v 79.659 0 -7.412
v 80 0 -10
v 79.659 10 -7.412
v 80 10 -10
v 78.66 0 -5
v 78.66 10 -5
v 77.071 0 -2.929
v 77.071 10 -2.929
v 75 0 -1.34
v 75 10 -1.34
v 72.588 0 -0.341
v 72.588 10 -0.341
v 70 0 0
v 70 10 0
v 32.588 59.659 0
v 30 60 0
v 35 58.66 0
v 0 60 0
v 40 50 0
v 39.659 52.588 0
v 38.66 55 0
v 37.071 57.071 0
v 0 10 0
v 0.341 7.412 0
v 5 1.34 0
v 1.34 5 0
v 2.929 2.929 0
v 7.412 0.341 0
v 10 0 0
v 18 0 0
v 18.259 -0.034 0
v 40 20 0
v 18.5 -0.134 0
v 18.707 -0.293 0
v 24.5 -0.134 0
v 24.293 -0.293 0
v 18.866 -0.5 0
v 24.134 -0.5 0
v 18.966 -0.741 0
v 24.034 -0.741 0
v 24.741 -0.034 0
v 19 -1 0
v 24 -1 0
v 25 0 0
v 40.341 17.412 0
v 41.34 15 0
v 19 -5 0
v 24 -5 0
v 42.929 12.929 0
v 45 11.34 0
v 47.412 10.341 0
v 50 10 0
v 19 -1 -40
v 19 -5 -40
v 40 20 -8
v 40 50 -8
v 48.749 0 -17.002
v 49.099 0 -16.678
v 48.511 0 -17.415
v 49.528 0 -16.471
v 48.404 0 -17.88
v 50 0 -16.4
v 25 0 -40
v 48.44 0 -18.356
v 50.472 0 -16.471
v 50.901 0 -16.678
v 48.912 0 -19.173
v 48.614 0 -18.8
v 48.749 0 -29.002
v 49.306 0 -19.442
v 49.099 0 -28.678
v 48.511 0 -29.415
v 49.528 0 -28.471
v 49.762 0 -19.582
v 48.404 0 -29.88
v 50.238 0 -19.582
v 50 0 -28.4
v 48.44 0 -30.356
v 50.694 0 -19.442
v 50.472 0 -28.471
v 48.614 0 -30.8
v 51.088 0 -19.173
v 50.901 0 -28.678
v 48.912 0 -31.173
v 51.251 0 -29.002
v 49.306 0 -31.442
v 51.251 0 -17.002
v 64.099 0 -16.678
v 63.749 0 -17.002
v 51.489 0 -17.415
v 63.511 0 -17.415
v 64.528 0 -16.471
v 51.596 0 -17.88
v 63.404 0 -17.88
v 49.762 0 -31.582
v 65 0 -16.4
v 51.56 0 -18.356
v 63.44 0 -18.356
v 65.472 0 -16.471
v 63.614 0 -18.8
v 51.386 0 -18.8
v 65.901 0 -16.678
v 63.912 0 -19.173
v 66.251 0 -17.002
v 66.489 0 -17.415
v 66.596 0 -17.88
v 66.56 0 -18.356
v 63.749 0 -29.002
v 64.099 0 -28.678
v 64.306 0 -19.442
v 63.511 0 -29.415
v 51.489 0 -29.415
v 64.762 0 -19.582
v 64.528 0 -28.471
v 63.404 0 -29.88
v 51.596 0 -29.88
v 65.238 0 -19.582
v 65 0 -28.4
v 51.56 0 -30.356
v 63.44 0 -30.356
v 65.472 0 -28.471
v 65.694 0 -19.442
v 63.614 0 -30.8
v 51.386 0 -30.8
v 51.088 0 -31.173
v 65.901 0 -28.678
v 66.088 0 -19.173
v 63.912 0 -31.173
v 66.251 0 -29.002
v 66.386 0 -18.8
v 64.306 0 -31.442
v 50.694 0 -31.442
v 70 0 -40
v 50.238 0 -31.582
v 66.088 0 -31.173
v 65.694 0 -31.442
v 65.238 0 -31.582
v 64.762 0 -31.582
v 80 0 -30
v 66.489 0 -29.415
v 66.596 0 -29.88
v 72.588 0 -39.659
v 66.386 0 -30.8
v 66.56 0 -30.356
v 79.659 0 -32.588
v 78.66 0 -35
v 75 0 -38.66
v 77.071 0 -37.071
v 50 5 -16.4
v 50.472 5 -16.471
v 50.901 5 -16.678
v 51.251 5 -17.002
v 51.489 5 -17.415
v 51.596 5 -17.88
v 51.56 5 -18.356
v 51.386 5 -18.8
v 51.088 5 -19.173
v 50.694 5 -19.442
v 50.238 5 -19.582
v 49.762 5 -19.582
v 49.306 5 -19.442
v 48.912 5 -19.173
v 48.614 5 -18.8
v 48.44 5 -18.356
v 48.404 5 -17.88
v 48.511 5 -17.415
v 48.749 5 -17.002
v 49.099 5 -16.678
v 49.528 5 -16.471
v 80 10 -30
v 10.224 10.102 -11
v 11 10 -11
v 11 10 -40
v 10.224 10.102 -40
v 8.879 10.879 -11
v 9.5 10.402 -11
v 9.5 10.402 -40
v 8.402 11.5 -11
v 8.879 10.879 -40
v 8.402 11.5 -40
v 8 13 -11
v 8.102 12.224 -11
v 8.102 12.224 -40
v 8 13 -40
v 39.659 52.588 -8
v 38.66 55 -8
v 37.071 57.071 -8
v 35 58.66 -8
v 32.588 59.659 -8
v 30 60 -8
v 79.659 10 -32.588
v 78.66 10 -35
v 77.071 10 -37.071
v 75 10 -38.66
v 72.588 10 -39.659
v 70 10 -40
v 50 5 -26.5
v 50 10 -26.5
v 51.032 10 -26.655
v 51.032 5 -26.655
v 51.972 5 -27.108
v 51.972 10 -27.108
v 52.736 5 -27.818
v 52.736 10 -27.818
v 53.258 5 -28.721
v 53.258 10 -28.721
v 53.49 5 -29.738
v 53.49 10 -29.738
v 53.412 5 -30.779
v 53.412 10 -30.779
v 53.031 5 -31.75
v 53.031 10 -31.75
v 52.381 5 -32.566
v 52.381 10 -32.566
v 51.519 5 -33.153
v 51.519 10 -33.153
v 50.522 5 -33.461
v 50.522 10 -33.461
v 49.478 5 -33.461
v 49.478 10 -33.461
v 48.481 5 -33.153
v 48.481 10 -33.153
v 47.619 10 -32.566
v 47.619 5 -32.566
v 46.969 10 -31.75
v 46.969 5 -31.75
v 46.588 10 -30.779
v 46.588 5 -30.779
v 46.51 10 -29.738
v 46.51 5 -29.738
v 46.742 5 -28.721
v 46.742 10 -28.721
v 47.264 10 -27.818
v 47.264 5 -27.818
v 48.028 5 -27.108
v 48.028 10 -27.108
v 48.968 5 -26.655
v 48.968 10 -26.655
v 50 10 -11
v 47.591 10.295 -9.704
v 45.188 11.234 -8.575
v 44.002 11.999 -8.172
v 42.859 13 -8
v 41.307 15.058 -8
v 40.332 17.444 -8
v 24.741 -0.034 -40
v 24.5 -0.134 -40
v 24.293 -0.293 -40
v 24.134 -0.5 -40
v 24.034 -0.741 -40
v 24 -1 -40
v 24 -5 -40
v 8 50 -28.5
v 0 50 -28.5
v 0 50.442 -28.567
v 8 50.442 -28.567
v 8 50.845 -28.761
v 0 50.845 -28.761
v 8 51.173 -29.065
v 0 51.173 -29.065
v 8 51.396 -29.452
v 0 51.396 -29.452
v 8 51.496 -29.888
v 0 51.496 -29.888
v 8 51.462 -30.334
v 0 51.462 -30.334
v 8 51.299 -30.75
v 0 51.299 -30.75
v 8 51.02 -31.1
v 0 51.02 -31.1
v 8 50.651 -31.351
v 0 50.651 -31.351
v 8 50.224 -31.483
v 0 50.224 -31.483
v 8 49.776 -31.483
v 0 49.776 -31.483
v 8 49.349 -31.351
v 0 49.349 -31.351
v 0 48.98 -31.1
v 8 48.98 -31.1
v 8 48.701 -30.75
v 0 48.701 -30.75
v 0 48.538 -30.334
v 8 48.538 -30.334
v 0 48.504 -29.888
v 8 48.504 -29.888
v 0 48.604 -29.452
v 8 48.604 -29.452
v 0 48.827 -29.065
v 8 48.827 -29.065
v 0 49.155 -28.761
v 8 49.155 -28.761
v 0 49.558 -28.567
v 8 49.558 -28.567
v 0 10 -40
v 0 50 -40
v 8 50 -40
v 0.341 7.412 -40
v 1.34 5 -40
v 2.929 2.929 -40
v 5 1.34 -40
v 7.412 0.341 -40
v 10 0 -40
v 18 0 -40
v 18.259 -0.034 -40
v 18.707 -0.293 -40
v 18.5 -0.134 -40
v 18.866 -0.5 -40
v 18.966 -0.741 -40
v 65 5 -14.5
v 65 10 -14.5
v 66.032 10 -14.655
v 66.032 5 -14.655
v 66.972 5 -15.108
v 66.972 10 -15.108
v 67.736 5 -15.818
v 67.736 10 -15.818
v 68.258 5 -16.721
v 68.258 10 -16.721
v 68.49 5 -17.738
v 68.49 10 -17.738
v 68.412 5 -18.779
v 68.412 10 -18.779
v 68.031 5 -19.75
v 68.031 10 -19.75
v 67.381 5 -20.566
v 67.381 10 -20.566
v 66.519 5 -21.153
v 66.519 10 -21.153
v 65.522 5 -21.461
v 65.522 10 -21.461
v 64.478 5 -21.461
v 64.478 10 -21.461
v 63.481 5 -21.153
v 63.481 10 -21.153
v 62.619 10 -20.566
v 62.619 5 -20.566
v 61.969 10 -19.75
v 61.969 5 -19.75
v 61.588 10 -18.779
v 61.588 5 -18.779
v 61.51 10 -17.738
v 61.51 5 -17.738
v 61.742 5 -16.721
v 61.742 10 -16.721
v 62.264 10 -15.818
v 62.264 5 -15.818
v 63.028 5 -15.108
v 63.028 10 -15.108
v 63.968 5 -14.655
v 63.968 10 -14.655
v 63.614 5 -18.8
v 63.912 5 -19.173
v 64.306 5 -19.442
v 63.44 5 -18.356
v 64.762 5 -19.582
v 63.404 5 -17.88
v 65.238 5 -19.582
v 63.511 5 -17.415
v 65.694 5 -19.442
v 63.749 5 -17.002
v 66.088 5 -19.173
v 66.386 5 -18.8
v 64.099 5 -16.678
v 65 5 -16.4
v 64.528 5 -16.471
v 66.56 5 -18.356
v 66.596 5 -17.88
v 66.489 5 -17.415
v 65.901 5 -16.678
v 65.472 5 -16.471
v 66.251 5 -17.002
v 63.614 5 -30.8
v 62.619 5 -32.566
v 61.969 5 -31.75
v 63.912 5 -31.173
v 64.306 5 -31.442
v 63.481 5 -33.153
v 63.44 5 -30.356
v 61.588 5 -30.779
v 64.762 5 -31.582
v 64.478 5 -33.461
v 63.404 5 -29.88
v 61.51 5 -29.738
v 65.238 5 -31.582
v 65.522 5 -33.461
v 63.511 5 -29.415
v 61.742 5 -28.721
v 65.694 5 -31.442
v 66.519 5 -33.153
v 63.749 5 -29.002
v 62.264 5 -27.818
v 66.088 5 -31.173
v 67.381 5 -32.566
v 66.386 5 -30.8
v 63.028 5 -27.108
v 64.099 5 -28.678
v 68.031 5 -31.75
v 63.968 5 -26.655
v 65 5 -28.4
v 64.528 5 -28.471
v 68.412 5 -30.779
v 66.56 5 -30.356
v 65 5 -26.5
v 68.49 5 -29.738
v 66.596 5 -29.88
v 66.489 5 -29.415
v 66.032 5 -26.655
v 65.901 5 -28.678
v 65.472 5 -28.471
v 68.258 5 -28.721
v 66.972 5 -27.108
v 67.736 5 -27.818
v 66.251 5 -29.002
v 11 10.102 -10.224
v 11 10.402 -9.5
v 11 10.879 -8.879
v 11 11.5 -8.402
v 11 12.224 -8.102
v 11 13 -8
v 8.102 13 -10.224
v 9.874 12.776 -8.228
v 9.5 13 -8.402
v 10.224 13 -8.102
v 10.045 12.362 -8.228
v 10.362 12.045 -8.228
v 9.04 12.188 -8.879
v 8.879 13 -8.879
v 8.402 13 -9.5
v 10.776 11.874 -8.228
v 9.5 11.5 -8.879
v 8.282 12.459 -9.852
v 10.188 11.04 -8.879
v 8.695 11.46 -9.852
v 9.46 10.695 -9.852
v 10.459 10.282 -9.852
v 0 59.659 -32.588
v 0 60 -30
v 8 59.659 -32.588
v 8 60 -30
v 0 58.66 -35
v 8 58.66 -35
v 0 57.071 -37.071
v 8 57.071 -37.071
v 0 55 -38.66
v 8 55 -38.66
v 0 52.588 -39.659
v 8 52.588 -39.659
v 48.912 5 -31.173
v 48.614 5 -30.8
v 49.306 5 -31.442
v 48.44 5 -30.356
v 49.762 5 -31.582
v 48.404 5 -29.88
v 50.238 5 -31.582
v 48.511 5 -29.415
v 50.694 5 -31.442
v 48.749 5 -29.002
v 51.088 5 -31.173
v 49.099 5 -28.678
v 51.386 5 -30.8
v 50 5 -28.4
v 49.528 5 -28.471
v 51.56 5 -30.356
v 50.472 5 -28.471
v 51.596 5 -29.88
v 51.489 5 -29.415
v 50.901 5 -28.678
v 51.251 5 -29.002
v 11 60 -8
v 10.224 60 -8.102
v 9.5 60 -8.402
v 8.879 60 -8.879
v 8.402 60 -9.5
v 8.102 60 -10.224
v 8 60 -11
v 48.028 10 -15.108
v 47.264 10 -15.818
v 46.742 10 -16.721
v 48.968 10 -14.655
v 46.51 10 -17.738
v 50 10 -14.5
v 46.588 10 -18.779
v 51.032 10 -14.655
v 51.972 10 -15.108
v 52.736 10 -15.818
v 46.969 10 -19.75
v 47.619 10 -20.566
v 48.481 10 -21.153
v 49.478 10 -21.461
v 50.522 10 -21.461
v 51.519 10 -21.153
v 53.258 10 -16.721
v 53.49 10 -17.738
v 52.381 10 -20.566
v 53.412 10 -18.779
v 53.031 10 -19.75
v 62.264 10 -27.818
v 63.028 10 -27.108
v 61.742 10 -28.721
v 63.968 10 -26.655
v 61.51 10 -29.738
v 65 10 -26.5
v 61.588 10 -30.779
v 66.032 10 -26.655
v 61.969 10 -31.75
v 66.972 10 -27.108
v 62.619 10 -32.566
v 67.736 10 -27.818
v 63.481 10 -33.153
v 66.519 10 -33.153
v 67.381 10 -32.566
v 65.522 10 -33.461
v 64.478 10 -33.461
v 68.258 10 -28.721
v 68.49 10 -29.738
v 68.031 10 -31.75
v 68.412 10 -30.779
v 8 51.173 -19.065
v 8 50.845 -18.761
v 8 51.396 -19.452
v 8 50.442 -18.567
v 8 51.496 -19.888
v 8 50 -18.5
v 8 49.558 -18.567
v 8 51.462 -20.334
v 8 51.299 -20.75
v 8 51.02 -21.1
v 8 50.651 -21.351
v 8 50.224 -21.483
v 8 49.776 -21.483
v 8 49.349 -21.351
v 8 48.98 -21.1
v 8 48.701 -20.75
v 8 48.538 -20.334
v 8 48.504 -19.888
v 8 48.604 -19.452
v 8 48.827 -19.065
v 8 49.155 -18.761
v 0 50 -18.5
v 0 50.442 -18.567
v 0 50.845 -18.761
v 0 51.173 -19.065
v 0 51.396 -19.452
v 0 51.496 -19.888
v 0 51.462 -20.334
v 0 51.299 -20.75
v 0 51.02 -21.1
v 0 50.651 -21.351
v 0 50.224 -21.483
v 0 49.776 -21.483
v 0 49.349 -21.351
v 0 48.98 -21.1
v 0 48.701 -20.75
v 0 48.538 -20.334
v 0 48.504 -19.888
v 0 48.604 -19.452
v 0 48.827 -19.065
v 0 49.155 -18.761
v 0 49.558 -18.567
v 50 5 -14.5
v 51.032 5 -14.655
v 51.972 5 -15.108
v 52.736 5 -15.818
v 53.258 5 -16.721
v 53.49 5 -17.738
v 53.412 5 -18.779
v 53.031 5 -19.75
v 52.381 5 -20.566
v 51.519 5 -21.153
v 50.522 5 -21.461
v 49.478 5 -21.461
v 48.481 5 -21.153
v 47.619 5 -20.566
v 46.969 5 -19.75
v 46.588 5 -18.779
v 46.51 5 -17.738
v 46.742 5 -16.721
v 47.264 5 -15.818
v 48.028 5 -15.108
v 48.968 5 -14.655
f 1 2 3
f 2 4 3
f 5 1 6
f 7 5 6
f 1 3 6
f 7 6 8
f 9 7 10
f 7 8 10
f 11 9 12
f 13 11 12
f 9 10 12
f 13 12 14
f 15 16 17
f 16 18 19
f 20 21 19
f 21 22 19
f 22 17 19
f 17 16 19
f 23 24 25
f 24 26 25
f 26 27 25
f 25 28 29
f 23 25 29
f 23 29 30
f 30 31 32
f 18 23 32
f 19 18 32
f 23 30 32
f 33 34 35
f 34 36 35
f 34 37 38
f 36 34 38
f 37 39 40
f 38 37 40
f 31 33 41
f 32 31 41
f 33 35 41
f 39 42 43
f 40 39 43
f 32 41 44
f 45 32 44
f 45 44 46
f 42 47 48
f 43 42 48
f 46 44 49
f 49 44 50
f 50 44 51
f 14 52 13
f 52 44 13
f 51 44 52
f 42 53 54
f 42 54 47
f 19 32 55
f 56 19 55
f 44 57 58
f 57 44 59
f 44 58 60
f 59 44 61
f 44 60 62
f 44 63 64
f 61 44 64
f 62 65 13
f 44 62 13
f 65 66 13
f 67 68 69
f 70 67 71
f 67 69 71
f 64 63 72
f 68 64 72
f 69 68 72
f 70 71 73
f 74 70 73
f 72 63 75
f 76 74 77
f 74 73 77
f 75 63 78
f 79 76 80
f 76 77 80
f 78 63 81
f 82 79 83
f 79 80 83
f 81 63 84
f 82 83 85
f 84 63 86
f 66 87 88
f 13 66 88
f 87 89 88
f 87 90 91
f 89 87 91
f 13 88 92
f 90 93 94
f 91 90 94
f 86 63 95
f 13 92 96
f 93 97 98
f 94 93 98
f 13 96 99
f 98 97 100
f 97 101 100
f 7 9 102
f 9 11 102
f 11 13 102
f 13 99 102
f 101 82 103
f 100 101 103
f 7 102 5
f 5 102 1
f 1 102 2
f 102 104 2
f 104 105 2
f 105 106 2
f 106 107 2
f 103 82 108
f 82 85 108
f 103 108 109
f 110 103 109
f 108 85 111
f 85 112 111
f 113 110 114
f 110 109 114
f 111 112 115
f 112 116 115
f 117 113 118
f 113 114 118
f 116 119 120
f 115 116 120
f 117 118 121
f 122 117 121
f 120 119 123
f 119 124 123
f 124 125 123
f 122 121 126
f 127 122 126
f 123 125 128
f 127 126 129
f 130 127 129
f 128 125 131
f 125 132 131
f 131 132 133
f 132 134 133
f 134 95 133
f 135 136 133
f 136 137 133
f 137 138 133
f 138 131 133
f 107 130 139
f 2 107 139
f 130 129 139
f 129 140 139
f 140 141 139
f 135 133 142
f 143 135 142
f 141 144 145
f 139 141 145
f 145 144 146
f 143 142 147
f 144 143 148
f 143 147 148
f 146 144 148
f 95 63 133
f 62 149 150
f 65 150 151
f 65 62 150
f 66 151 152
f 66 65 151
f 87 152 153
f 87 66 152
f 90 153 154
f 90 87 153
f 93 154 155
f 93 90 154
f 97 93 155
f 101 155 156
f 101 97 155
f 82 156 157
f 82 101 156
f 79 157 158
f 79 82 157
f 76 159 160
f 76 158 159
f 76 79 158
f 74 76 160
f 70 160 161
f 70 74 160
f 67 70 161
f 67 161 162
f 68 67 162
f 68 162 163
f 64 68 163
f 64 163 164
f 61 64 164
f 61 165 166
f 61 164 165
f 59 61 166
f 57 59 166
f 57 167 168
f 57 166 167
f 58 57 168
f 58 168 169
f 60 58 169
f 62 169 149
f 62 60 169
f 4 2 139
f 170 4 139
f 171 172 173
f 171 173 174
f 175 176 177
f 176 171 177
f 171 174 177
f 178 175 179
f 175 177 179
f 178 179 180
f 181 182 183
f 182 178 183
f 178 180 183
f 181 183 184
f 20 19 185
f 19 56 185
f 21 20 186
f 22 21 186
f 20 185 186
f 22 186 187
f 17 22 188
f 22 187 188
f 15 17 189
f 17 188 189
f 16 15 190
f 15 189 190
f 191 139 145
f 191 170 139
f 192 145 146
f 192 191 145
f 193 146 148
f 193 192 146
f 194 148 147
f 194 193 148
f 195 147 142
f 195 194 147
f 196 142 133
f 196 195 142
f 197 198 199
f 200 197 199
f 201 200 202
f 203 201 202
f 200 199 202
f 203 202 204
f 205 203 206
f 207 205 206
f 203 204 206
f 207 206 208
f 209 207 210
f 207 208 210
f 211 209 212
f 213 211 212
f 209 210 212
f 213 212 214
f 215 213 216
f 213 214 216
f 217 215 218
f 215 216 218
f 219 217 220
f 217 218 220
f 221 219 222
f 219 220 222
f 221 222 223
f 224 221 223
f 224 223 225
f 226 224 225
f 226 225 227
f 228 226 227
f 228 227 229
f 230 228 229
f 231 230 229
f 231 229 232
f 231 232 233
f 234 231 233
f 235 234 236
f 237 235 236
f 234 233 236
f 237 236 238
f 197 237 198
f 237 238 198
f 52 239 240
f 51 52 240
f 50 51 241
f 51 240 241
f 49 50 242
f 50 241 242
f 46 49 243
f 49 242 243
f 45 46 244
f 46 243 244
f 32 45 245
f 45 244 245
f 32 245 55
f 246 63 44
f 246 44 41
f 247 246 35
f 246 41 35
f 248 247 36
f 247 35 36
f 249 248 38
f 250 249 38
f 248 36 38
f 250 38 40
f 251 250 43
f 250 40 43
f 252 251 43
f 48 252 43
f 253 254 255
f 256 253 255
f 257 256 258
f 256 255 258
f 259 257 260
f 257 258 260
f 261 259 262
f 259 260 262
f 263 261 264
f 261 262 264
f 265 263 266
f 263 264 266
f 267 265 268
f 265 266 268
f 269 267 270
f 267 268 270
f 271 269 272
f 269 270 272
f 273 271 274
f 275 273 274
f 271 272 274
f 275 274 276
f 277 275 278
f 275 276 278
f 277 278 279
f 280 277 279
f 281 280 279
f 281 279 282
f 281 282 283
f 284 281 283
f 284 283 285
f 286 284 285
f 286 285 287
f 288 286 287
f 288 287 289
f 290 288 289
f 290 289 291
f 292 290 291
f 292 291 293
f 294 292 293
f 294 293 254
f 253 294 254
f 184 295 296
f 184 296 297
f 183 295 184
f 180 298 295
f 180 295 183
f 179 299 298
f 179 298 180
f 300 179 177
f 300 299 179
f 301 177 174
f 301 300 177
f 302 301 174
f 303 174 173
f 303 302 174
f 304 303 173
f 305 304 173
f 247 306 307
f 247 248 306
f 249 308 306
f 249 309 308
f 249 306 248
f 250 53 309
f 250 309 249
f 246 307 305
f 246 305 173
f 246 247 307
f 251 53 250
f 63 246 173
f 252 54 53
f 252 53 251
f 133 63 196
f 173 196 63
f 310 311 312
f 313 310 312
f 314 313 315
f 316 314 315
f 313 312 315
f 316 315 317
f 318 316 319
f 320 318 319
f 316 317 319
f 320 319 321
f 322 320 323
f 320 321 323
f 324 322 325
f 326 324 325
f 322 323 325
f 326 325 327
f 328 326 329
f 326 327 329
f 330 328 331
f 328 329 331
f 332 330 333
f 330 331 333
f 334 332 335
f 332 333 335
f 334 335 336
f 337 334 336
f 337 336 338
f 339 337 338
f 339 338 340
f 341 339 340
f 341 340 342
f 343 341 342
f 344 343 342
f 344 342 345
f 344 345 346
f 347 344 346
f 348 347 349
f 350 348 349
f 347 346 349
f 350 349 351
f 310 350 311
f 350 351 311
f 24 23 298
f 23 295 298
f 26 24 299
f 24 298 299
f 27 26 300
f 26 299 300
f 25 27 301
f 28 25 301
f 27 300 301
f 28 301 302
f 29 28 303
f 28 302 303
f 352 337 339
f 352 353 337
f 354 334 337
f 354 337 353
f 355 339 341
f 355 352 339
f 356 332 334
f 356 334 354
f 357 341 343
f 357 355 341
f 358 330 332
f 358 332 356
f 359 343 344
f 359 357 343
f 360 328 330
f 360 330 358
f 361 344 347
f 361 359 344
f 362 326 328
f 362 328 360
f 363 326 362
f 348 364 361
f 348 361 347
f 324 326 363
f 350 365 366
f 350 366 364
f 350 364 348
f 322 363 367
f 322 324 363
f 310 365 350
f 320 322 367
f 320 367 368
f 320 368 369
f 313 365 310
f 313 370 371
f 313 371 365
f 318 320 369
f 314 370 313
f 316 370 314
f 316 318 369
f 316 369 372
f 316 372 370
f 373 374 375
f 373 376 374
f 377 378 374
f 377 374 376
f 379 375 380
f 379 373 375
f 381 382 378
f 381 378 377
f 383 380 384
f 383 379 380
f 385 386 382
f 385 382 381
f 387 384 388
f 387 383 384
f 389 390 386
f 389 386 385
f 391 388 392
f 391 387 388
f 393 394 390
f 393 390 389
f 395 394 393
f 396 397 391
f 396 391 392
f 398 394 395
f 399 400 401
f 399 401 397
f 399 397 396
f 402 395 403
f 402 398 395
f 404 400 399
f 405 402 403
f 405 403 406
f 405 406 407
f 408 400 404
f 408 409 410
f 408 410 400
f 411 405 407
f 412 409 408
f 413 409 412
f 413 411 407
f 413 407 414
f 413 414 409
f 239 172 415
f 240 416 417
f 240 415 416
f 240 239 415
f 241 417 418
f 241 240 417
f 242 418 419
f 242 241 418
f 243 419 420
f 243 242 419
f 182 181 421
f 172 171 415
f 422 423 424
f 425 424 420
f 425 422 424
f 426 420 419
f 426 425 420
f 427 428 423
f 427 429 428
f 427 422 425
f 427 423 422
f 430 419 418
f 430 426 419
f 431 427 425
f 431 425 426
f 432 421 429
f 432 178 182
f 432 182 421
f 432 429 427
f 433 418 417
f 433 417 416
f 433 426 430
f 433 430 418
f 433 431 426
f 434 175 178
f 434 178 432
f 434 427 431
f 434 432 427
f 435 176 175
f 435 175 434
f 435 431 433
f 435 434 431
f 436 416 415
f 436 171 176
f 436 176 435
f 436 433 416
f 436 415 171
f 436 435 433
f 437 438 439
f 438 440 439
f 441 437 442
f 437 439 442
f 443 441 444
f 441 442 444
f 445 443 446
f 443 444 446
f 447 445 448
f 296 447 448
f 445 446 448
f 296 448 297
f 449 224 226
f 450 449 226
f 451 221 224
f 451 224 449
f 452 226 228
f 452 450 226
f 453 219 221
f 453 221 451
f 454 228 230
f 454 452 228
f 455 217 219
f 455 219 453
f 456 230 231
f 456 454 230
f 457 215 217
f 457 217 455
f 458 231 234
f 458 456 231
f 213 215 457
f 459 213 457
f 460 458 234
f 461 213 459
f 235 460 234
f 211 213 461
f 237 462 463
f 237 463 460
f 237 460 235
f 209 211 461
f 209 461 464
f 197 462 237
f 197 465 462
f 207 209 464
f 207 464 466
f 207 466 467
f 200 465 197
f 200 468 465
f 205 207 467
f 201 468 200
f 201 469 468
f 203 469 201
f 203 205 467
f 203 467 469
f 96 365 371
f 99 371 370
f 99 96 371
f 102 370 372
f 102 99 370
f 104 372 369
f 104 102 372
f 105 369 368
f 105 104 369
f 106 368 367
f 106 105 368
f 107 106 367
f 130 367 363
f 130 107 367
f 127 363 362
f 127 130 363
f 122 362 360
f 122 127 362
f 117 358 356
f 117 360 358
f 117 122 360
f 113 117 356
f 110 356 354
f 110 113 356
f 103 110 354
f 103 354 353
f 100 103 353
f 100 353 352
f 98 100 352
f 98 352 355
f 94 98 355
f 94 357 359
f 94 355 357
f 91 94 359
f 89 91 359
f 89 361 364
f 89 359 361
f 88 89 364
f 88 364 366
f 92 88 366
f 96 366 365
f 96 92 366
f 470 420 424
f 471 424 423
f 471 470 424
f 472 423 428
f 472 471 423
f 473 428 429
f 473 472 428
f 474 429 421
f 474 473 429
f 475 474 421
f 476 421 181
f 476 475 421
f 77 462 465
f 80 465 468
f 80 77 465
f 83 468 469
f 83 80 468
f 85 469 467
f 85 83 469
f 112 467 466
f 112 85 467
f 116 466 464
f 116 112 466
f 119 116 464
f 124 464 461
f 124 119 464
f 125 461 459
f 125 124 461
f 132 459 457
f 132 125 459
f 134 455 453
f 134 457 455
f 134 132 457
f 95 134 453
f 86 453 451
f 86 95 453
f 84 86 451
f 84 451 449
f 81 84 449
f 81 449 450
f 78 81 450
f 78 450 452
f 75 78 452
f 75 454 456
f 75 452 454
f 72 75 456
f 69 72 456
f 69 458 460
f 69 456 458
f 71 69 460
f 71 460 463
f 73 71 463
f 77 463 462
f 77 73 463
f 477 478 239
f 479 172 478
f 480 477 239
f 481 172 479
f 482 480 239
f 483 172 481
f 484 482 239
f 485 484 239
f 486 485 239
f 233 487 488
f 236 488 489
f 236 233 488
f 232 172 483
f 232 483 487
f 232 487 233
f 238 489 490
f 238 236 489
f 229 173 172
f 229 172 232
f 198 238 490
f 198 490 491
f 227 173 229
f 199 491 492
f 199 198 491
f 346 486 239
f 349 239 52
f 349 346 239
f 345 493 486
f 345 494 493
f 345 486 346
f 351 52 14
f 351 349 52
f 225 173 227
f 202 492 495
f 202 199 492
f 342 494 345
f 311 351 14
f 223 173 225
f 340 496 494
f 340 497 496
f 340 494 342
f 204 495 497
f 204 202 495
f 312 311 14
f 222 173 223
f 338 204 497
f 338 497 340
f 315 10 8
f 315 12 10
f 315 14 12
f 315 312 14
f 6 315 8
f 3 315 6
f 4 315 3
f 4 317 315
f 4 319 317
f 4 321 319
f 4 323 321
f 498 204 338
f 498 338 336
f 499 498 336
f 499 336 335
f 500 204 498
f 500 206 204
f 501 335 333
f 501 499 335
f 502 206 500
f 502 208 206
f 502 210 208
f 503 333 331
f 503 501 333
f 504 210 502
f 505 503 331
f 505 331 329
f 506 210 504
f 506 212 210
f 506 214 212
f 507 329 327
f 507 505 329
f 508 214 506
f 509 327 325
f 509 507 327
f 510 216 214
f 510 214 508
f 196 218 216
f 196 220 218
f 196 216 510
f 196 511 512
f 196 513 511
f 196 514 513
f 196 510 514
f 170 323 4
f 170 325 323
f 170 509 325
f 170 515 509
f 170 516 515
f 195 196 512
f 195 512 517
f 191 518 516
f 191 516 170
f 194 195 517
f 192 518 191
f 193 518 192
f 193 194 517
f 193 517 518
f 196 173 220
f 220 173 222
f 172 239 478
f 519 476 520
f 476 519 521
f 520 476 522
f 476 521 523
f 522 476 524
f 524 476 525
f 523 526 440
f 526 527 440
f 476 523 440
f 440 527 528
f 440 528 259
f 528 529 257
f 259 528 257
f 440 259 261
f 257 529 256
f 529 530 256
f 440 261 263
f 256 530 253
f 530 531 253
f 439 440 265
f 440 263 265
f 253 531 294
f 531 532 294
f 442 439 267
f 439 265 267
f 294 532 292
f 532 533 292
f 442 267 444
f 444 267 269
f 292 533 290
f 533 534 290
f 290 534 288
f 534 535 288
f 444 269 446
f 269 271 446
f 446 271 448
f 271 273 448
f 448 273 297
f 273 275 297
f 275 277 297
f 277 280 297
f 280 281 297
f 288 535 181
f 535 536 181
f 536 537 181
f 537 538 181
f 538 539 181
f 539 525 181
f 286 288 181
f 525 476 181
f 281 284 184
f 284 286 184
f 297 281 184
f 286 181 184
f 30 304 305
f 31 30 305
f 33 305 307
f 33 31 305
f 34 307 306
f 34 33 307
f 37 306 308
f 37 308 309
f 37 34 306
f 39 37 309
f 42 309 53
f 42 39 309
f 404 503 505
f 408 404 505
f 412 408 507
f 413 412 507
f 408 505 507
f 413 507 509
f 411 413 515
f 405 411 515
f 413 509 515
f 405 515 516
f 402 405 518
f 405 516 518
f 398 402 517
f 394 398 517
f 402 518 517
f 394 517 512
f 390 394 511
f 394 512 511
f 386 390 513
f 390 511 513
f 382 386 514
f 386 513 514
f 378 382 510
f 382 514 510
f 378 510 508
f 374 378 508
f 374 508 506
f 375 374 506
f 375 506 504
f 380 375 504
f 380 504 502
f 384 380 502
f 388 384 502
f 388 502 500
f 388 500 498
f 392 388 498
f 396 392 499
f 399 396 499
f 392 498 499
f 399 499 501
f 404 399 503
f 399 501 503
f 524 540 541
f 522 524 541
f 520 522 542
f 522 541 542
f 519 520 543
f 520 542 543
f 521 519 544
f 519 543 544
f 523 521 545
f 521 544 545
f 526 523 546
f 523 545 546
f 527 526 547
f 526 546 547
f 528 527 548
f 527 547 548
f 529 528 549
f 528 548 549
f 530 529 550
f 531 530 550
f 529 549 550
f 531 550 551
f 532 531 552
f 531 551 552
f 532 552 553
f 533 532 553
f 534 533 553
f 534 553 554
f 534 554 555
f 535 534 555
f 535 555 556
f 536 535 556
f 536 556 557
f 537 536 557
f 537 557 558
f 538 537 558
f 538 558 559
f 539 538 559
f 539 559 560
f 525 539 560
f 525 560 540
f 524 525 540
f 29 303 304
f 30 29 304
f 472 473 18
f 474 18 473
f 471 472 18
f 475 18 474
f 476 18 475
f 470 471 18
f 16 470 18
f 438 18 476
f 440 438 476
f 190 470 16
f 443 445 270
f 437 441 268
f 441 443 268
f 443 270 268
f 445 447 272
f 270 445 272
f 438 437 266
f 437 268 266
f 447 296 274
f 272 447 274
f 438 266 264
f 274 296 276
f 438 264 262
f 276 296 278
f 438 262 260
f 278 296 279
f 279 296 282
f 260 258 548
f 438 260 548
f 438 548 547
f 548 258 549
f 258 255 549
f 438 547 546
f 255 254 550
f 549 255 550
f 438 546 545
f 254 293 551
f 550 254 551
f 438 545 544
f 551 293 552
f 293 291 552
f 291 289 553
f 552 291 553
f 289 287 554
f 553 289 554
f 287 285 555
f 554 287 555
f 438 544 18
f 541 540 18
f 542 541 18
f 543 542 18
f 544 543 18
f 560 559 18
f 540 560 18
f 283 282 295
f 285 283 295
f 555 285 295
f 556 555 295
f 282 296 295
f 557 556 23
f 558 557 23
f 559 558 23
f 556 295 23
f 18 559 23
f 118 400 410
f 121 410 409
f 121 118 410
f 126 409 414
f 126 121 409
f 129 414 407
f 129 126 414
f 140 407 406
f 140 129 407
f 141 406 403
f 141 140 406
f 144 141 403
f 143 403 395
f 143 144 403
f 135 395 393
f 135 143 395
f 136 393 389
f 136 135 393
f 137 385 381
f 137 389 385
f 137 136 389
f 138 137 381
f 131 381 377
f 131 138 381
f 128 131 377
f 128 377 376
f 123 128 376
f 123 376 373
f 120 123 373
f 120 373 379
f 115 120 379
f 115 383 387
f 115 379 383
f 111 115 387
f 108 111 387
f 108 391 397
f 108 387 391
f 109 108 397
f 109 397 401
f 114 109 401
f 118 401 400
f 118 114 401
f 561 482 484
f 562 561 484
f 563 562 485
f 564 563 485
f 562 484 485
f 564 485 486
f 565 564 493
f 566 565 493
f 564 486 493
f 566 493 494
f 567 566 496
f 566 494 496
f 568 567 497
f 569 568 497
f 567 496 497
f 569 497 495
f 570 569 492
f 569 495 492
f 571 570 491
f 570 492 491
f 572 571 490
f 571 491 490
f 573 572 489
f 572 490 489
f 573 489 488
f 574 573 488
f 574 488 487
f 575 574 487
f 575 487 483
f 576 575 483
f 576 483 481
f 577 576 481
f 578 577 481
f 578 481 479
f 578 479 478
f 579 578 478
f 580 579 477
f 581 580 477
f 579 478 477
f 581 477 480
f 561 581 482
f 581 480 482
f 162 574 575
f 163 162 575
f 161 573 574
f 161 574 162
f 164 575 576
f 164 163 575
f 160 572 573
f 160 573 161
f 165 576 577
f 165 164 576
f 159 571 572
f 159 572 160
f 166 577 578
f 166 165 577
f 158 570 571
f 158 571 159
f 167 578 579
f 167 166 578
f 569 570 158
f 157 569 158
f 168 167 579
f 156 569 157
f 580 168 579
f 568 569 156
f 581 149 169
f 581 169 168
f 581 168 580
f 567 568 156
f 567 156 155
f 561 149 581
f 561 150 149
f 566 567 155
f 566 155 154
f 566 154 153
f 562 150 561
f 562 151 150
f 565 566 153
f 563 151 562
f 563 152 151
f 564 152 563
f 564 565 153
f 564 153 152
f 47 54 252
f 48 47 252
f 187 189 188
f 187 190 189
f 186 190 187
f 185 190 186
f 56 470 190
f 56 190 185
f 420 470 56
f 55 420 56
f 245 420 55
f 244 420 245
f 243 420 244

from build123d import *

# Parameters (mm, degrees)
SKETCH1_W           = 80
SKETCH1_H           = 40
SKETCH1_R           = 1.6
BOSS_EXTRUDE1_DEPTH = 10
SKETCH2_W           = 8
SKETCH2_H           = 32
SKETCH2_H_2         = 8
SKETCH2_W_2         = 32
BOSS_EXTRUDE2_DEPTH = 50
FILLET1_R           = 10
FILLET2_R           = 3
SKETCH3_R           = 3.5
CUT_EXTRUDE1_DEPTH  = 5
FILLET3_R           = 10
SKETCH4_W           = 5
SKETCH4_H           = 40
BOSS_EXTRUDE3_DEPTH = 5
FILLET4_R           = 1
SKETCH5_R           = 1.5
CUT_EXTRUDE2_DEPTH  = 80


with BuildPart() as part:
    # Sketch1 → Boss-Extrude1 (new body)
    with BuildSketch(Plane(origin=(0, 0, 0), x_dir=(1, 0, 0), z_dir=(0, 1, 0))):
        with Locations((40, 20)):
            Rectangle(SKETCH1_W, SKETCH1_H)
        with Locations(Location((65, 30, 0), (0, 0, 270))):
            Circle(SKETCH1_R, mode=Mode.SUBTRACT)
        with Locations(Location((50, 30, 0), (0, 0, 270))):
            Circle(SKETCH1_R, mode=Mode.SUBTRACT)
        with Locations(Location((50, 18, 0), (0, 0, 270))):
            Circle(SKETCH1_R, mode=Mode.SUBTRACT)
        with Locations(Location((65, 18, 0), (0, 0, 270))):
            Circle(SKETCH1_R, mode=Mode.SUBTRACT)
    extrude(amount=BOSS_EXTRUDE1_DEPTH)

    # Sketch2 → Boss-Extrude2 (add)
    with BuildSketch(Plane(origin=(0, 10, 0), x_dir=(1, 0, 0), z_dir=(0, 1, 0))):
        with Locations((4, 24)):
            Rectangle(SKETCH2_W, SKETCH2_H)
        with Locations((4, 4)):
            Rectangle(SKETCH2_W, SKETCH2_H_2)
        with Locations((24, 4)):
            Rectangle(SKETCH2_W_2, SKETCH2_H_2)
    extrude(amount=BOSS_EXTRUDE2_DEPTH)

    # Fillet1
    fillet1_edges = [part.edges().sort_by_distance(p)[0] for p in [
        (40, 10, -4),
        (40, 60, -4),
        (4, 60, -40),
        (80, 5, -40),
        (80, 5, 0),
    ]]
    fillet(fillet1_edges, radius=FILLET1_R)

    # Fillet2
    fillet2_edges = [part.edges().sort_by_distance(p)[0] for p in [
        (8, 10, -24),
        (8, 35, -8),
        (29, 10, -8),
    ]]
    fillet(fillet2_edges, radius=FILLET2_R)

    # Sketch3 → Cut-Extrude1 (cut)
    with BuildSketch(Plane(origin=(0, 10, 0), x_dir=(1, 0, 0), z_dir=(0, 1, 0))):
        with Locations(Location((50, 30, 0), (0, 0, 270))):
            Circle(SKETCH3_R)
        with Locations(Location((50, 18, 0), (0, 0, 270))):
            Circle(SKETCH3_R)
        with Locations(Location((65, 18, 0), (0, 0, 270))):
            Circle(SKETCH3_R)
        with Locations(Location((65, 30, 0), (0, 0, 270))):
            Circle(SKETCH3_R)
    extrude(amount=-CUT_EXTRUDE1_DEPTH, mode=Mode.SUBTRACT)

    # Fillet3
    fillet3_edges = [part.edges().sort_by_distance(p)[0] for p in [
        (0, 0, -20),
    ]]
    fillet(fillet3_edges, radius=FILLET3_R)

    # Sketch4 → Boss-Extrude3 (add)
    with BuildSketch(Plane.XZ):
        with Locations((21.5, -20)):
            Rectangle(SKETCH4_W, SKETCH4_H)
    extrude(amount=BOSS_EXTRUDE3_DEPTH)

    # Fillet4
    fillet4_edges = [part.edges().sort_by_distance(p)[0] for p in [
        (19, 0, -20),
        (24, 0, -20),
    ]]
    fillet(fillet4_edges, radius=FILLET4_R)

    # Sketch5 → Cut-Extrude2 (cut)
    with BuildSketch(Plane.ZY):
        with Locations((-30, 50)):
            Circle(SKETCH5_R)
        with Locations((-20, 50)):
            Circle(SKETCH5_R)
    extrude(amount=-CUT_EXTRUDE2_DEPTH, mode=Mode.SUBTRACT)


solid = part.part
